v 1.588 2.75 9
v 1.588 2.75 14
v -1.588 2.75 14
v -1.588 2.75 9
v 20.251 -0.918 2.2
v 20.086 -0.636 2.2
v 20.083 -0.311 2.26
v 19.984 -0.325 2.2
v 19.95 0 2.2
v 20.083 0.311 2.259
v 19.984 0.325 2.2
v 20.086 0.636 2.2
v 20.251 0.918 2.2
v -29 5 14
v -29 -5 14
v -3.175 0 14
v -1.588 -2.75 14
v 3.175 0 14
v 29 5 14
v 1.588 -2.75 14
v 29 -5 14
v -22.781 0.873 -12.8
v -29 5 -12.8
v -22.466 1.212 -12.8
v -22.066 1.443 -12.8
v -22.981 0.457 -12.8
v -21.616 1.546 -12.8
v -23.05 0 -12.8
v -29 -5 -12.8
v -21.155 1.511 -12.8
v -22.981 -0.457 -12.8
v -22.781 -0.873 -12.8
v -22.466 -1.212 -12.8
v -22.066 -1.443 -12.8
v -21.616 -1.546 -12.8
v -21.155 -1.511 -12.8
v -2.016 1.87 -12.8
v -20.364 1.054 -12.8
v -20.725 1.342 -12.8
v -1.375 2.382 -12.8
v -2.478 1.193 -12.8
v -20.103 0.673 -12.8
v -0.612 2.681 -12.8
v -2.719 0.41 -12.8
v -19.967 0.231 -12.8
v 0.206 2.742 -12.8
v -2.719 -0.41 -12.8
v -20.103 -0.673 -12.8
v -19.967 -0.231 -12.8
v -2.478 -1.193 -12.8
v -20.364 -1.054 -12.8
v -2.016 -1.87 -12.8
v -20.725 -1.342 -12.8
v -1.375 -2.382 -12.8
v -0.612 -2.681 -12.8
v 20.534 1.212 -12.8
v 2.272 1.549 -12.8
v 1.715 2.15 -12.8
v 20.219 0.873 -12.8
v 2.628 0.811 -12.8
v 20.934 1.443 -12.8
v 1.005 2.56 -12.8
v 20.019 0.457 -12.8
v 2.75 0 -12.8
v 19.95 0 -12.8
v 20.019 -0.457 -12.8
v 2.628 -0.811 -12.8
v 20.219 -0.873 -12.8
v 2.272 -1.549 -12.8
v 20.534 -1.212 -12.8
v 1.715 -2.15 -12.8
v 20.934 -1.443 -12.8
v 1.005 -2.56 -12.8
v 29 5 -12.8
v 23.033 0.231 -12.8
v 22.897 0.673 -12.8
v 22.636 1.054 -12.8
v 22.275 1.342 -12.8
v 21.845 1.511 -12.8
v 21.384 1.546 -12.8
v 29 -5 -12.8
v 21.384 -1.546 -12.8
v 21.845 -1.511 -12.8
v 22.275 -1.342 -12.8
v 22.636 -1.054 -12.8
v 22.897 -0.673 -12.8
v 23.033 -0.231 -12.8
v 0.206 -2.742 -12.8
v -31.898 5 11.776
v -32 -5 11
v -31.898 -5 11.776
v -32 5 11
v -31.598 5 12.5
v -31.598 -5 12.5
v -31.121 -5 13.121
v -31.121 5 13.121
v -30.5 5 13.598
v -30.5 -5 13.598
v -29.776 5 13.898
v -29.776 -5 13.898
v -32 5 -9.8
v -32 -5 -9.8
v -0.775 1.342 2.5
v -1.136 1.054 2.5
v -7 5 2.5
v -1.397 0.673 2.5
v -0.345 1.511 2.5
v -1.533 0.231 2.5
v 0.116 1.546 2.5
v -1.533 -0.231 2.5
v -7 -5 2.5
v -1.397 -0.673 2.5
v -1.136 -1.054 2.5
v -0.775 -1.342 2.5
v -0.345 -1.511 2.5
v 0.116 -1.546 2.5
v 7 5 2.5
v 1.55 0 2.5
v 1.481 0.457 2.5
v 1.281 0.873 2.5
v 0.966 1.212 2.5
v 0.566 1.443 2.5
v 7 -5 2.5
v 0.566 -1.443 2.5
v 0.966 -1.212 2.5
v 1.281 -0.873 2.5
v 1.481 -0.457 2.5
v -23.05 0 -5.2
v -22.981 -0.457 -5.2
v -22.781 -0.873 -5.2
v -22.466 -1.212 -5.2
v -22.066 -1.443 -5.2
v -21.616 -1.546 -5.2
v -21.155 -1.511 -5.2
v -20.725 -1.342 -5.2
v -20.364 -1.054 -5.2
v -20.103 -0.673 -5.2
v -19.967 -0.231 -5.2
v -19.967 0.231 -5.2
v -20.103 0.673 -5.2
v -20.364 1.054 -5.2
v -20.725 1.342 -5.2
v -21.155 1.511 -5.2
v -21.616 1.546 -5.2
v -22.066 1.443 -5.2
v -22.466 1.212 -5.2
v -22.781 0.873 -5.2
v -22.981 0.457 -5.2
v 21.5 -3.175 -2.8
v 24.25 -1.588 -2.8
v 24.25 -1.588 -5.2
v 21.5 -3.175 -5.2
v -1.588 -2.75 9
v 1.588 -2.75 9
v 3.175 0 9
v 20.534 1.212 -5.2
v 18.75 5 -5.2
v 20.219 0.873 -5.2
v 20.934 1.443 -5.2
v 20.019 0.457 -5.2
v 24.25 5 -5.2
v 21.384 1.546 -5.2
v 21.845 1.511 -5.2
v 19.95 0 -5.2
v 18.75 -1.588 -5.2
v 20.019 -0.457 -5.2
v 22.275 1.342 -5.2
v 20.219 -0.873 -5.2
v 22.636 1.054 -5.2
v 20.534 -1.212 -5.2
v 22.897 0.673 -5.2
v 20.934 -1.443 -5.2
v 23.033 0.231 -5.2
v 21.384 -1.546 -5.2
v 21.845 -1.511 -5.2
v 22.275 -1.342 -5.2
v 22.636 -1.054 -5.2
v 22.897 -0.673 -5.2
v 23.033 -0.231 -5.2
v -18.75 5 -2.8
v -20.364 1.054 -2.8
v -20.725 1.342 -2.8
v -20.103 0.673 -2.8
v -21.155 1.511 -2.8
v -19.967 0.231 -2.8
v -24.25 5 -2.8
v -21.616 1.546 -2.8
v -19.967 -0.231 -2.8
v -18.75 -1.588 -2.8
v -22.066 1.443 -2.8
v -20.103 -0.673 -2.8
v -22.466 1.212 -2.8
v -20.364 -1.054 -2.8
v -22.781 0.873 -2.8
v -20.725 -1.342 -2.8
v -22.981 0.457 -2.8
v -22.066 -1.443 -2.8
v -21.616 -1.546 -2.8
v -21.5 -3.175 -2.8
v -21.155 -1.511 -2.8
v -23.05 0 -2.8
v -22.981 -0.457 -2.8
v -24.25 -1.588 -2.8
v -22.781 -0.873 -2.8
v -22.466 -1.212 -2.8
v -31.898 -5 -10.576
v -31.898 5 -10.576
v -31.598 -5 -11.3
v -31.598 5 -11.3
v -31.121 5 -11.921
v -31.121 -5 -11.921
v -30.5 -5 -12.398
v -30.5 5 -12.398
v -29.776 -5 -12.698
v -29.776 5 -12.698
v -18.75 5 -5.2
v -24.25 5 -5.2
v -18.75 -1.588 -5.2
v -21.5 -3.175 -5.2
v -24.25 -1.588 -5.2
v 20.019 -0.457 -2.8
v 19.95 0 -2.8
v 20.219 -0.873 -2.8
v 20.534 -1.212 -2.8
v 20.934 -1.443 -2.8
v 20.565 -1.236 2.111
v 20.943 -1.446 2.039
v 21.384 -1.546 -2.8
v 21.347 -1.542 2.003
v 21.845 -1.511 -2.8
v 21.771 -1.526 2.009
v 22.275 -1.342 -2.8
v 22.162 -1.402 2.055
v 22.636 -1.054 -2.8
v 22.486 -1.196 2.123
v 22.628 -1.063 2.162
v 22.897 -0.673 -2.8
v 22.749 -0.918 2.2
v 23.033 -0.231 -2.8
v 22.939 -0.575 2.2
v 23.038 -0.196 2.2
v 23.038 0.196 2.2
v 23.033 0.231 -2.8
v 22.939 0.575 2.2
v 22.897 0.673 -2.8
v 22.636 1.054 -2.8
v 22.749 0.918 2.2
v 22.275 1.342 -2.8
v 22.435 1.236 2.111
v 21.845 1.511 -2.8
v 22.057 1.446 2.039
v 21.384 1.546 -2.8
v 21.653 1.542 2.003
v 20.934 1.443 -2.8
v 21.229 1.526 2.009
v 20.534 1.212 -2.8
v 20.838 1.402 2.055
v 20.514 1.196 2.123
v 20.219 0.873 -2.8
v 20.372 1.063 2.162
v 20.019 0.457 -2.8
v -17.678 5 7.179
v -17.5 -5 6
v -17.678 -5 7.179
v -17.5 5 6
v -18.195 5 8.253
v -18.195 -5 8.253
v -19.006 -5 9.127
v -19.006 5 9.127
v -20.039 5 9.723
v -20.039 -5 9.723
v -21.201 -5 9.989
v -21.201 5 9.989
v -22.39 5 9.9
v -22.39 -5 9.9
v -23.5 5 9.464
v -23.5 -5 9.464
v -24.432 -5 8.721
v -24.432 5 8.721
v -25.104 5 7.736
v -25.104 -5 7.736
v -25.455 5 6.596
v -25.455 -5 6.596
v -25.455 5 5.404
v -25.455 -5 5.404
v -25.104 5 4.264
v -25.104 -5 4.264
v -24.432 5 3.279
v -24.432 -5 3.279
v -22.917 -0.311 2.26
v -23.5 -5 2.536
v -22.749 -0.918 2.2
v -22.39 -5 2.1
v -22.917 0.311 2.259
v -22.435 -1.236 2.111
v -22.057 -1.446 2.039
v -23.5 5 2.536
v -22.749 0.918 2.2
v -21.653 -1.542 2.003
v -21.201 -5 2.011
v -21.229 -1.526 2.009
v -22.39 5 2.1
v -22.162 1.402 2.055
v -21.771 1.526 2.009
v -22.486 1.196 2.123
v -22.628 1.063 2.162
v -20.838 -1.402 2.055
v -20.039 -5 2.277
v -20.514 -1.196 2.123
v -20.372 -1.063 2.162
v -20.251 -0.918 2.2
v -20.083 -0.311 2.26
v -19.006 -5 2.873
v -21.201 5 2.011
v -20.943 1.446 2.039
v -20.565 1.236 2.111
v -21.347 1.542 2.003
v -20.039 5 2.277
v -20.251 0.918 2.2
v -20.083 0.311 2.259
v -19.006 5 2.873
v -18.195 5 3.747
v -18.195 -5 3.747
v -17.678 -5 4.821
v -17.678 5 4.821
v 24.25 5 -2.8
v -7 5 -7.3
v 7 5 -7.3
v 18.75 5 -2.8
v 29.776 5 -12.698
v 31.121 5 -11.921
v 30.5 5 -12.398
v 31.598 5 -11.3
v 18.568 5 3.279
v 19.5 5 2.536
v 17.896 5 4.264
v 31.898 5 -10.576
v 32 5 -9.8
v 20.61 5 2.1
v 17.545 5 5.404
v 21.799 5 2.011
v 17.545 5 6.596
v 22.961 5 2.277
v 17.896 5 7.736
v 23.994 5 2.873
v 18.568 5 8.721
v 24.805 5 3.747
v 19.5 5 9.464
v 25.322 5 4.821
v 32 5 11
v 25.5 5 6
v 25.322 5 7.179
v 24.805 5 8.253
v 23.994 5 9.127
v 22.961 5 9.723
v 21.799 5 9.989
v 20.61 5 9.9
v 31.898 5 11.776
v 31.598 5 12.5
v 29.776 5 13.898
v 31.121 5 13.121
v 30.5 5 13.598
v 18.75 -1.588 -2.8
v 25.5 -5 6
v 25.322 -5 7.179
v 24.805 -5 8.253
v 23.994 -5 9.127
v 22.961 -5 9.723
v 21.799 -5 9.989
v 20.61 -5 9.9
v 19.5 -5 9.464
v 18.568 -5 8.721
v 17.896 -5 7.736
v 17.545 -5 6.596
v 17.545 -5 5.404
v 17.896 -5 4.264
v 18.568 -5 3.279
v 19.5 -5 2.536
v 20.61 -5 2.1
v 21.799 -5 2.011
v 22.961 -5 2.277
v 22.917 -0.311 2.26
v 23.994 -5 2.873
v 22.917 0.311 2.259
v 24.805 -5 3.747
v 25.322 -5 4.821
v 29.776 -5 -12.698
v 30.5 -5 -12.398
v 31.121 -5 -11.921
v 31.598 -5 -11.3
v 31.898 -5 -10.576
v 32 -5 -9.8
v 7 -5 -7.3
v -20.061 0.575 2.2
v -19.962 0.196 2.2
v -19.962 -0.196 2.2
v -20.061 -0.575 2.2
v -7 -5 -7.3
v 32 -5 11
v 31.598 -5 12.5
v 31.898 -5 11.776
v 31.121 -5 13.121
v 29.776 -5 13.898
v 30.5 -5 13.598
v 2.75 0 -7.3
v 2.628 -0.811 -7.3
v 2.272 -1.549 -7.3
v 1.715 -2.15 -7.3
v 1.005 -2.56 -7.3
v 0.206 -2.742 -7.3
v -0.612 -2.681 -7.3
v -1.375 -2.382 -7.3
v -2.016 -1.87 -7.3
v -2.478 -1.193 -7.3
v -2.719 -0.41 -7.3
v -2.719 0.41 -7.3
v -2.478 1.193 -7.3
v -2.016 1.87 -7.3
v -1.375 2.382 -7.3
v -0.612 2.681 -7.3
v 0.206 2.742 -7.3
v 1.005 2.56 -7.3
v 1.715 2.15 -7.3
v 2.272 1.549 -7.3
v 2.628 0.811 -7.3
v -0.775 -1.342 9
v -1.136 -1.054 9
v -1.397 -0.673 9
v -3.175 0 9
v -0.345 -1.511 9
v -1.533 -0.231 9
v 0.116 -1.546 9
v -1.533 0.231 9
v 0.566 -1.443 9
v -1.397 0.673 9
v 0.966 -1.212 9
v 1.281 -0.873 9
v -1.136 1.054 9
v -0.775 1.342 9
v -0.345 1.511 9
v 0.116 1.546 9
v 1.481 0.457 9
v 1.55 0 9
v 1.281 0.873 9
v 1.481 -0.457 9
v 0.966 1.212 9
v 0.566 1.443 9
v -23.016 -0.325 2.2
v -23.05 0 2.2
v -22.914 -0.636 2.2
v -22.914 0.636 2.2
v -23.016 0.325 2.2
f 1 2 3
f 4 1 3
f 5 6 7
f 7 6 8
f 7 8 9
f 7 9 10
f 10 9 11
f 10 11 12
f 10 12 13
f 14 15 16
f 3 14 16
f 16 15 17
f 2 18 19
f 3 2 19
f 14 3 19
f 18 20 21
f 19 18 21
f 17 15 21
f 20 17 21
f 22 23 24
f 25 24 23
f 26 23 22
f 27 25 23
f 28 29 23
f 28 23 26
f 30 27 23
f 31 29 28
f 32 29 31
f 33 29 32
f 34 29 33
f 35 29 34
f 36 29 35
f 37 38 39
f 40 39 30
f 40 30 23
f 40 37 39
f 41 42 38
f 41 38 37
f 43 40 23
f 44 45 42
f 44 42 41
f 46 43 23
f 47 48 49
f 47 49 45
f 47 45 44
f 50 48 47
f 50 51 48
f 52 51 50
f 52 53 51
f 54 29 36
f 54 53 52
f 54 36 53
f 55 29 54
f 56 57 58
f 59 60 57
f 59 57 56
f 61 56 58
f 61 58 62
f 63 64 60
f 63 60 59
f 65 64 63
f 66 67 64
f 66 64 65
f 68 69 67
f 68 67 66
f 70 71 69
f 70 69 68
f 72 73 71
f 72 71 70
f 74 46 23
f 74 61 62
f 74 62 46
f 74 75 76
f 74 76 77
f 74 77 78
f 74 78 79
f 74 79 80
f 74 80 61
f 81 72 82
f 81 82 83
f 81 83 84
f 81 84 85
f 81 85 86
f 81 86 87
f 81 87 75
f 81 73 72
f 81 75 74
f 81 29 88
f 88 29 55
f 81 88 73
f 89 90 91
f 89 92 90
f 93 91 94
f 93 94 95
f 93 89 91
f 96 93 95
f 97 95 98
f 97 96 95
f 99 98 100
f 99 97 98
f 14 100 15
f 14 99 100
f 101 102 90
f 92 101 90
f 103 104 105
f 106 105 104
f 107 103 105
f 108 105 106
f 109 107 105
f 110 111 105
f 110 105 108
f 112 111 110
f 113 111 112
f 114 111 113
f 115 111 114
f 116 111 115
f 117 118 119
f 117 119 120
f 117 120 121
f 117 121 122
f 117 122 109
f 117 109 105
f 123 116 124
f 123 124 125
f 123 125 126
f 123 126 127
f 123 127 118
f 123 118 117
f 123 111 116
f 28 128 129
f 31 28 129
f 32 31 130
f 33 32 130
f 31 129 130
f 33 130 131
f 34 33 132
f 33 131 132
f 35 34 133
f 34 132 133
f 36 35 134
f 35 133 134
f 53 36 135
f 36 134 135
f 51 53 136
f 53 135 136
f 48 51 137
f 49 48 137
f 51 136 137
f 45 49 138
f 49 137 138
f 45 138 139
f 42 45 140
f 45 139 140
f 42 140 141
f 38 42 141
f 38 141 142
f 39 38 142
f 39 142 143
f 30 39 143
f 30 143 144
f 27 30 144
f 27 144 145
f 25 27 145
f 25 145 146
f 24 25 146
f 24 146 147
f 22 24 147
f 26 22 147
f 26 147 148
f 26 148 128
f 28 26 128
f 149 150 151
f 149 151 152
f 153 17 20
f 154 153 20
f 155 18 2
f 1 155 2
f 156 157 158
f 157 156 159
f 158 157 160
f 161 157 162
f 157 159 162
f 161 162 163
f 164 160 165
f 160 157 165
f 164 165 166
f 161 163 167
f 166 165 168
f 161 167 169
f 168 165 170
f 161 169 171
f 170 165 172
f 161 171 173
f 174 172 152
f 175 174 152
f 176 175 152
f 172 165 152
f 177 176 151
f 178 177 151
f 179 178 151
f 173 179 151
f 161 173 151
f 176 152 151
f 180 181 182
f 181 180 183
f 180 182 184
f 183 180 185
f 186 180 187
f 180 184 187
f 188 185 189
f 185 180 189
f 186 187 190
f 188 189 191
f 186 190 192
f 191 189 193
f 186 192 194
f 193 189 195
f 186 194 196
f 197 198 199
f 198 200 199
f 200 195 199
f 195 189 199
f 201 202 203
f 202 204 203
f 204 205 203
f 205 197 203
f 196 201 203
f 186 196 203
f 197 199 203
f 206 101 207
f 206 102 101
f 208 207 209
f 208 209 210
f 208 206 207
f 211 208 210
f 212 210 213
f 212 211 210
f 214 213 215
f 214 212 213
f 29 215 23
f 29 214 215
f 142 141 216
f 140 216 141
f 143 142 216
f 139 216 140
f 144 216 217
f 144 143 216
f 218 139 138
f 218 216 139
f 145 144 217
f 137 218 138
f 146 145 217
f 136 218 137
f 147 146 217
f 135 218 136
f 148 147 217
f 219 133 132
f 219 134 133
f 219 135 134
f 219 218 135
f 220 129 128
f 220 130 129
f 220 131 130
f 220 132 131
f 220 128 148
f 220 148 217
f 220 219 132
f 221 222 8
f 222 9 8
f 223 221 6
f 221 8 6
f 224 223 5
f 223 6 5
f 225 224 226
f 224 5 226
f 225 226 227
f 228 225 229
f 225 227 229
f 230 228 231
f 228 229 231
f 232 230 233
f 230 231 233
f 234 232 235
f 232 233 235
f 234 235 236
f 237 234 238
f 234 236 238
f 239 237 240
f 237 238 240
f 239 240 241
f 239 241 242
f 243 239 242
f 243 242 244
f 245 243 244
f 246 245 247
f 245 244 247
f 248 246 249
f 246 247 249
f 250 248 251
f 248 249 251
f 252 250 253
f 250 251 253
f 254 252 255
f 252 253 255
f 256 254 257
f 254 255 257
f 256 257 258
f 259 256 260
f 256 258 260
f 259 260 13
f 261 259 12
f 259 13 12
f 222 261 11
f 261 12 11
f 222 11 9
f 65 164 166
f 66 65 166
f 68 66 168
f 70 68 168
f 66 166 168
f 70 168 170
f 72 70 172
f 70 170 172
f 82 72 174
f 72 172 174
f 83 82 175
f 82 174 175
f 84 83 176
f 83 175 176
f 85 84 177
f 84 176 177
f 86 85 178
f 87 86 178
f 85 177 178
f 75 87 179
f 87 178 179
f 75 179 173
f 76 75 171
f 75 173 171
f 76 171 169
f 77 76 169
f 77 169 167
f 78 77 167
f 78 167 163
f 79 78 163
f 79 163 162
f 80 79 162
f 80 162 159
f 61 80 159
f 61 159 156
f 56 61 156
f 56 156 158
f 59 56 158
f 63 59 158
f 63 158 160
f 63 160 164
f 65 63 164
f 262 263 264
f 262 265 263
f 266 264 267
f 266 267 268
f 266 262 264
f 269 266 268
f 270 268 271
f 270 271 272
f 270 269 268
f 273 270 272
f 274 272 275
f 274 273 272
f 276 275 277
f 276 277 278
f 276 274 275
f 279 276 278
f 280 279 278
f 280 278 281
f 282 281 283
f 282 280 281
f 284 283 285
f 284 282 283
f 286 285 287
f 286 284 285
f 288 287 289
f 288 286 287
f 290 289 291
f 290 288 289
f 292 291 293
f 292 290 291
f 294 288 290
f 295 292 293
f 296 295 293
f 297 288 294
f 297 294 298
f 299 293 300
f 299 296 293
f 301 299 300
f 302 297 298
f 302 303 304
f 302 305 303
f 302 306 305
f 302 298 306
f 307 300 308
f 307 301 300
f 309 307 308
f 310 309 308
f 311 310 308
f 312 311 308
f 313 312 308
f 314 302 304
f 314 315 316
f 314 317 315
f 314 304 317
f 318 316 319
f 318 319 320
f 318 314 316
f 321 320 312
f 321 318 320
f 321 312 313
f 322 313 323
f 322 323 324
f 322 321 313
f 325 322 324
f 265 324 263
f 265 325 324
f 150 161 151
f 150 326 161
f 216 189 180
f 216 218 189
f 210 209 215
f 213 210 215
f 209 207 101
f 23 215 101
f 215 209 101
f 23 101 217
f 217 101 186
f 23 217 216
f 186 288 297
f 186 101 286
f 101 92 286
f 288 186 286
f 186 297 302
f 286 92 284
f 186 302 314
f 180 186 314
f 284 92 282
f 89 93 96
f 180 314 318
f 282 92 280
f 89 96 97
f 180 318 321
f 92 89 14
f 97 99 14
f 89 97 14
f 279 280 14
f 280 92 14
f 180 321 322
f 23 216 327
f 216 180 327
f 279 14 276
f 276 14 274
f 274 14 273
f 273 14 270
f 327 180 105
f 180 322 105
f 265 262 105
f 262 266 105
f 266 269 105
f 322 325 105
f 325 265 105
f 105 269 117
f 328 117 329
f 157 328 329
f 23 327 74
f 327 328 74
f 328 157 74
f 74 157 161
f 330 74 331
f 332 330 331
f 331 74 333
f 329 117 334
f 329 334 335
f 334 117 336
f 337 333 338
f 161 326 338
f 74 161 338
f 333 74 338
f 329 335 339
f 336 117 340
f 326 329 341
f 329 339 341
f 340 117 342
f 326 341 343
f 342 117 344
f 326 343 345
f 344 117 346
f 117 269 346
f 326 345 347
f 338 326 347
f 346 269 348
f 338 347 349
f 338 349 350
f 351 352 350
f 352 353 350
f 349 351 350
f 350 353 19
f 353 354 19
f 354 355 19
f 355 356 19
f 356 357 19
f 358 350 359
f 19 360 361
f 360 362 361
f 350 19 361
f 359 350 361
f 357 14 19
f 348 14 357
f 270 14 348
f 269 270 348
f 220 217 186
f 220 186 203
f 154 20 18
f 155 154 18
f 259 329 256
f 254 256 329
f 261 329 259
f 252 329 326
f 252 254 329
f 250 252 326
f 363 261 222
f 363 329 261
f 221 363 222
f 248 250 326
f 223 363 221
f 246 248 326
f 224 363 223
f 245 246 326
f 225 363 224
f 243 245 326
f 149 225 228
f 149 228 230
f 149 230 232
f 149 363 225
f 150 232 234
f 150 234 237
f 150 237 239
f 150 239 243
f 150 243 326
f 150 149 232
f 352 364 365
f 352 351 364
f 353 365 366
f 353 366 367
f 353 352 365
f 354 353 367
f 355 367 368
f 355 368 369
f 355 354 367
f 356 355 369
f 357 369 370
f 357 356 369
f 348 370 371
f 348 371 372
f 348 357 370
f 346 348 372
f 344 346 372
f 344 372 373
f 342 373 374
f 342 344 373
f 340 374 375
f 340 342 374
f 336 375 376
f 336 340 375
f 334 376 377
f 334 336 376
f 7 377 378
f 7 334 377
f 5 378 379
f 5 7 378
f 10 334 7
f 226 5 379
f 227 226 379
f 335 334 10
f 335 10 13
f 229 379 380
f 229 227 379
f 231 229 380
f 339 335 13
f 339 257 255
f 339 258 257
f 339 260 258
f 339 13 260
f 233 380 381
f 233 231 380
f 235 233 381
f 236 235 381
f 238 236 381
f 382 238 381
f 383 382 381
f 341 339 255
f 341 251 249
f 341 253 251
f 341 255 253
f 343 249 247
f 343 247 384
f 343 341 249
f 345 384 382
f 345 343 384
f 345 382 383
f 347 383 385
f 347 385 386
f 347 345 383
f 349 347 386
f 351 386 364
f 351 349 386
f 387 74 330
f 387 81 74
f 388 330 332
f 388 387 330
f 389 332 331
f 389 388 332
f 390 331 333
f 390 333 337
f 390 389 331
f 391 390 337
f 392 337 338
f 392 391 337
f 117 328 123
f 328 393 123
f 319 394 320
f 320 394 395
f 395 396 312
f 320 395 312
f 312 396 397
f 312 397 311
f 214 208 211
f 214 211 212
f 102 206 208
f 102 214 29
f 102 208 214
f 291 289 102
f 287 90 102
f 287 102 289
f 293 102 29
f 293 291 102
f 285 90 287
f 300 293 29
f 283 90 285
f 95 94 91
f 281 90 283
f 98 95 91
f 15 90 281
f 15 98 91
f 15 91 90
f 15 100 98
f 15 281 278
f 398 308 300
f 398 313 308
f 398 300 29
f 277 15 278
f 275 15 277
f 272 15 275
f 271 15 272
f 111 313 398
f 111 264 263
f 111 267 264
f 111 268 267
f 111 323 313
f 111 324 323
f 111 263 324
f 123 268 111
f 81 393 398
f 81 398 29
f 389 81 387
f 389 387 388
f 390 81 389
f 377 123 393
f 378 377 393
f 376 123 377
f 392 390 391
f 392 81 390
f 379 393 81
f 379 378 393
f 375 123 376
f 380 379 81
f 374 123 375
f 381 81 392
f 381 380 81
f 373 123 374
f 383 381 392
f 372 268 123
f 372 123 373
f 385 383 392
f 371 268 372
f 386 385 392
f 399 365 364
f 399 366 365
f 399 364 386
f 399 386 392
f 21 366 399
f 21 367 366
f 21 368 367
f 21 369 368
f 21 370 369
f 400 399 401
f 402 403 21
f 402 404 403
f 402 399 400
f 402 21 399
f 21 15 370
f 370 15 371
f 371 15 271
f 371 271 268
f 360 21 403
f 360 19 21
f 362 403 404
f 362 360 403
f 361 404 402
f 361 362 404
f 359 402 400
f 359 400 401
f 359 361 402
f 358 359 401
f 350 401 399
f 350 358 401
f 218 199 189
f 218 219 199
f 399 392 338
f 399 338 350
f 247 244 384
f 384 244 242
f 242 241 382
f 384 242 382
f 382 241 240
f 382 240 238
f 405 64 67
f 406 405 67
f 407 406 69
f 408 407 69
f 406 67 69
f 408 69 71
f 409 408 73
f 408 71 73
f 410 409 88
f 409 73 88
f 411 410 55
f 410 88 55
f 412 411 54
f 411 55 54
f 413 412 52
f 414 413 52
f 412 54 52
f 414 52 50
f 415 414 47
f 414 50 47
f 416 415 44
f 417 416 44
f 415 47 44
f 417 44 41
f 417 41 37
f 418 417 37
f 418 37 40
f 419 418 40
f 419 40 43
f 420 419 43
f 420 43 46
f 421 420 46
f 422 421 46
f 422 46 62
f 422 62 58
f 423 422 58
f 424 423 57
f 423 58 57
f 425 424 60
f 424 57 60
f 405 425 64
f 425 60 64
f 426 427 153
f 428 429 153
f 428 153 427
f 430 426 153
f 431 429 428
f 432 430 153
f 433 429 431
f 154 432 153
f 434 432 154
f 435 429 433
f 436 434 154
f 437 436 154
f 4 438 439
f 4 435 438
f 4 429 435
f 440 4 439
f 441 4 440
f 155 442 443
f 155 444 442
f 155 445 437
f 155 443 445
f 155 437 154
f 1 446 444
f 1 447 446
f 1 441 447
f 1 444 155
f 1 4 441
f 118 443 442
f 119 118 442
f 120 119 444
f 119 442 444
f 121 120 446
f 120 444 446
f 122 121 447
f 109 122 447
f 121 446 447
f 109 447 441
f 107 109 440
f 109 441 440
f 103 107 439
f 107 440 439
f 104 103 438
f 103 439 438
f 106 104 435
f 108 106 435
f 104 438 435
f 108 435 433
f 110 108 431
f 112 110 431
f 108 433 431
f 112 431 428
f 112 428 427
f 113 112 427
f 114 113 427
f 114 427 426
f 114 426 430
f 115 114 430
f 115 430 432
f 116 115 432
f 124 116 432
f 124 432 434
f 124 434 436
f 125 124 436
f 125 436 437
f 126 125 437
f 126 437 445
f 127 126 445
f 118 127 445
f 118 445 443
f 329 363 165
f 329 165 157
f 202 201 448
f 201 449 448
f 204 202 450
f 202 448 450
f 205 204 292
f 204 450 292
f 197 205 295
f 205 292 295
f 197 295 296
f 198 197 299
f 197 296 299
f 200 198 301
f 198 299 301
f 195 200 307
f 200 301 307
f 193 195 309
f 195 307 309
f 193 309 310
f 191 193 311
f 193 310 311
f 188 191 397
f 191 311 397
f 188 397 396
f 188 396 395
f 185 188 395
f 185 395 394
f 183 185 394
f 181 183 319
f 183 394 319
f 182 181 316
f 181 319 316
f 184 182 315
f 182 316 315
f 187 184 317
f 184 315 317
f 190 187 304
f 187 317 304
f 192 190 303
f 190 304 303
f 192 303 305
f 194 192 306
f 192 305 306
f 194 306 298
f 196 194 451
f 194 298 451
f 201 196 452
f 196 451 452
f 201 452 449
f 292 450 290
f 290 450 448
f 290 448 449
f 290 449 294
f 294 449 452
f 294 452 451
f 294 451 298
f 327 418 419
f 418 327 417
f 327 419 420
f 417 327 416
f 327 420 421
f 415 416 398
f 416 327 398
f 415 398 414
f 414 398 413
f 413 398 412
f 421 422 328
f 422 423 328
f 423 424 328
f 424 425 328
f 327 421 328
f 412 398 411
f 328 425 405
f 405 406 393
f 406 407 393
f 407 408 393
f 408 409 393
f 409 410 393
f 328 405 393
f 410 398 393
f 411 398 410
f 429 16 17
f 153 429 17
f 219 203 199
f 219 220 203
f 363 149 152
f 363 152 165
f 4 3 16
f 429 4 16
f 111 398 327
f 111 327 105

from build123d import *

# Parameters (mm, degrees)
F0_W      = 64
F0_H      = 28
F0_W_2    = 14
F0_H_2    = 9.8
F0_R      = 4
F1_DEPTH  = 5
F1_FACE_W = 64
F1_FACE_H = 10
F4_DEPTH  = 1.2
F5_DEPTH  = 1.2
F7_D      = 3.1
F7_DEPTH  = 15
F7_TIP    = 0.9313339595
F8_R      = 2.75
F9_DEPTH  = 5.5
F10_R     = 1.55
F11_DEPTH = 5
F12_DEPTH = 11.5
F13_R     = 3


# Not quite as in the source:
# - a pattern or mirror of a feature is missing from the dataset's text; its kind, count and spacing are read off the source's solid


with BuildPart() as f1:
    # F0 (on Front) → F1 (new body, symmetric)
    with BuildSketch(Plane.XZ):
        Rectangle(F0_W, F0_H)
        with Locations((0, -2.4)):
            Rectangle(F0_W_2, F0_H_2, mode=Mode.SUBTRACT)
        with Locations((-21.5, 6)):
            Circle(F0_R, mode=Mode.SUBTRACT)
        with Locations((21.5, 6)):
            Circle(F0_R, mode=Mode.SUBTRACT)
    extrude(amount=F1_DEPTH, both=True)

    # F3 (on offset) + F1_face (on face) → F4 (cut, symmetric)
    with BuildSketch(Plane(origin=(0, 0, -4), x_dir=(1, 0, 0), z_dir=(0, 0, -1))):
        Polygon((18.75, 1.5877132403), (18.75, -1.5877132403), (18.75, -5), (24.25, -5), (24.25, 1.5877132403), (21.5, 3.1754264805), align=None)
    with BuildSketch(Plane(origin=(0, 0, -14), x_dir=(1, 0, 0), z_dir=(0, 0, -1))):
        Rectangle(F1_FACE_W, F1_FACE_H)
    extrude(amount=F4_DEPTH, both=True, mode=Mode.SUBTRACT)

    # F3 (on offset) → F5 (cut, symmetric)
    with BuildSketch(Plane(origin=(0, 0, -4), x_dir=(1, 0, 0), z_dir=(0, 0, -1))):
        Polygon((18.75, 1.5877132403), (18.75, -1.5877132403), (18.75, -5), (24.25, -5), (24.25, 1.5877132403), (21.5, 3.1754264805), align=None)
    f5 = extrude(amount=F5_DEPTH, both=True, mode=Mode.SUBTRACT)

    # F5_copies: F5 across plane
    add(f5.mirror(Plane(origin=(0, 0, 0), x_dir=(0, 0, -1), z_dir=(-1, 0, 0))), mode=Mode.SUBTRACT)

    # F7
    with Locations(Plane(origin=(0, 0, -12.8), x_dir=(1, 0, 0), z_dir=(0, 0, -1))):
        with Locations((21.5, 0), (-21.5, 0)):
            Hole(F7_D / 2, depth=F7_DEPTH)
            with Locations((0, 0, -(F7_DEPTH + F7_TIP / 2))):  # 118° drill point
                Cone(0, F7_D / 2, F7_TIP, mode=Mode.SUBTRACT)

    # F8 (on face) → F9 (cut, through all)
    with BuildSketch(Plane(origin=(0, 0, -12.8), x_dir=(1, 0, 0), z_dir=(0, 0, -1))):
        Circle(F8_R)
    extrude(amount=-F9_DEPTH, mode=Mode.SUBTRACT)

    # F10 (on face) → F11 (cut)
    with BuildSketch(Plane.XY.offset(14)):
        Polygon((-1.5877132403, -2.75), (1.5877132403, -2.75), (3.1754264805, 0), (1.5877132403, 2.75), (-1.5877132403, 2.75), (-3.1754264805, 0), align=None)
        Circle(F10_R, mode=Mode.SUBTRACT)
    extrude(amount=-F11_DEPTH, mode=Mode.SUBTRACT)

    # F12 (cut, through all): a face of the model
    f12_faces = [f1.faces().sort_by_distance(p)[0] for p in [
        (0, 0, 14),
    ]]
    extrude(f12_faces, amount=-F12_DEPTH, mode=Mode.SUBTRACT)

    # F13
    f13_edges = [f1.edges().sort_by_distance(p)[0] for p in [
        (32, 0, 14),
        (-32, 0, 14),
        (32, 0, -12.8),
        (-32, 0, -12.8),
    ]]
    fillet(f13_edges, radius=F13_R)


solid = f1.part
